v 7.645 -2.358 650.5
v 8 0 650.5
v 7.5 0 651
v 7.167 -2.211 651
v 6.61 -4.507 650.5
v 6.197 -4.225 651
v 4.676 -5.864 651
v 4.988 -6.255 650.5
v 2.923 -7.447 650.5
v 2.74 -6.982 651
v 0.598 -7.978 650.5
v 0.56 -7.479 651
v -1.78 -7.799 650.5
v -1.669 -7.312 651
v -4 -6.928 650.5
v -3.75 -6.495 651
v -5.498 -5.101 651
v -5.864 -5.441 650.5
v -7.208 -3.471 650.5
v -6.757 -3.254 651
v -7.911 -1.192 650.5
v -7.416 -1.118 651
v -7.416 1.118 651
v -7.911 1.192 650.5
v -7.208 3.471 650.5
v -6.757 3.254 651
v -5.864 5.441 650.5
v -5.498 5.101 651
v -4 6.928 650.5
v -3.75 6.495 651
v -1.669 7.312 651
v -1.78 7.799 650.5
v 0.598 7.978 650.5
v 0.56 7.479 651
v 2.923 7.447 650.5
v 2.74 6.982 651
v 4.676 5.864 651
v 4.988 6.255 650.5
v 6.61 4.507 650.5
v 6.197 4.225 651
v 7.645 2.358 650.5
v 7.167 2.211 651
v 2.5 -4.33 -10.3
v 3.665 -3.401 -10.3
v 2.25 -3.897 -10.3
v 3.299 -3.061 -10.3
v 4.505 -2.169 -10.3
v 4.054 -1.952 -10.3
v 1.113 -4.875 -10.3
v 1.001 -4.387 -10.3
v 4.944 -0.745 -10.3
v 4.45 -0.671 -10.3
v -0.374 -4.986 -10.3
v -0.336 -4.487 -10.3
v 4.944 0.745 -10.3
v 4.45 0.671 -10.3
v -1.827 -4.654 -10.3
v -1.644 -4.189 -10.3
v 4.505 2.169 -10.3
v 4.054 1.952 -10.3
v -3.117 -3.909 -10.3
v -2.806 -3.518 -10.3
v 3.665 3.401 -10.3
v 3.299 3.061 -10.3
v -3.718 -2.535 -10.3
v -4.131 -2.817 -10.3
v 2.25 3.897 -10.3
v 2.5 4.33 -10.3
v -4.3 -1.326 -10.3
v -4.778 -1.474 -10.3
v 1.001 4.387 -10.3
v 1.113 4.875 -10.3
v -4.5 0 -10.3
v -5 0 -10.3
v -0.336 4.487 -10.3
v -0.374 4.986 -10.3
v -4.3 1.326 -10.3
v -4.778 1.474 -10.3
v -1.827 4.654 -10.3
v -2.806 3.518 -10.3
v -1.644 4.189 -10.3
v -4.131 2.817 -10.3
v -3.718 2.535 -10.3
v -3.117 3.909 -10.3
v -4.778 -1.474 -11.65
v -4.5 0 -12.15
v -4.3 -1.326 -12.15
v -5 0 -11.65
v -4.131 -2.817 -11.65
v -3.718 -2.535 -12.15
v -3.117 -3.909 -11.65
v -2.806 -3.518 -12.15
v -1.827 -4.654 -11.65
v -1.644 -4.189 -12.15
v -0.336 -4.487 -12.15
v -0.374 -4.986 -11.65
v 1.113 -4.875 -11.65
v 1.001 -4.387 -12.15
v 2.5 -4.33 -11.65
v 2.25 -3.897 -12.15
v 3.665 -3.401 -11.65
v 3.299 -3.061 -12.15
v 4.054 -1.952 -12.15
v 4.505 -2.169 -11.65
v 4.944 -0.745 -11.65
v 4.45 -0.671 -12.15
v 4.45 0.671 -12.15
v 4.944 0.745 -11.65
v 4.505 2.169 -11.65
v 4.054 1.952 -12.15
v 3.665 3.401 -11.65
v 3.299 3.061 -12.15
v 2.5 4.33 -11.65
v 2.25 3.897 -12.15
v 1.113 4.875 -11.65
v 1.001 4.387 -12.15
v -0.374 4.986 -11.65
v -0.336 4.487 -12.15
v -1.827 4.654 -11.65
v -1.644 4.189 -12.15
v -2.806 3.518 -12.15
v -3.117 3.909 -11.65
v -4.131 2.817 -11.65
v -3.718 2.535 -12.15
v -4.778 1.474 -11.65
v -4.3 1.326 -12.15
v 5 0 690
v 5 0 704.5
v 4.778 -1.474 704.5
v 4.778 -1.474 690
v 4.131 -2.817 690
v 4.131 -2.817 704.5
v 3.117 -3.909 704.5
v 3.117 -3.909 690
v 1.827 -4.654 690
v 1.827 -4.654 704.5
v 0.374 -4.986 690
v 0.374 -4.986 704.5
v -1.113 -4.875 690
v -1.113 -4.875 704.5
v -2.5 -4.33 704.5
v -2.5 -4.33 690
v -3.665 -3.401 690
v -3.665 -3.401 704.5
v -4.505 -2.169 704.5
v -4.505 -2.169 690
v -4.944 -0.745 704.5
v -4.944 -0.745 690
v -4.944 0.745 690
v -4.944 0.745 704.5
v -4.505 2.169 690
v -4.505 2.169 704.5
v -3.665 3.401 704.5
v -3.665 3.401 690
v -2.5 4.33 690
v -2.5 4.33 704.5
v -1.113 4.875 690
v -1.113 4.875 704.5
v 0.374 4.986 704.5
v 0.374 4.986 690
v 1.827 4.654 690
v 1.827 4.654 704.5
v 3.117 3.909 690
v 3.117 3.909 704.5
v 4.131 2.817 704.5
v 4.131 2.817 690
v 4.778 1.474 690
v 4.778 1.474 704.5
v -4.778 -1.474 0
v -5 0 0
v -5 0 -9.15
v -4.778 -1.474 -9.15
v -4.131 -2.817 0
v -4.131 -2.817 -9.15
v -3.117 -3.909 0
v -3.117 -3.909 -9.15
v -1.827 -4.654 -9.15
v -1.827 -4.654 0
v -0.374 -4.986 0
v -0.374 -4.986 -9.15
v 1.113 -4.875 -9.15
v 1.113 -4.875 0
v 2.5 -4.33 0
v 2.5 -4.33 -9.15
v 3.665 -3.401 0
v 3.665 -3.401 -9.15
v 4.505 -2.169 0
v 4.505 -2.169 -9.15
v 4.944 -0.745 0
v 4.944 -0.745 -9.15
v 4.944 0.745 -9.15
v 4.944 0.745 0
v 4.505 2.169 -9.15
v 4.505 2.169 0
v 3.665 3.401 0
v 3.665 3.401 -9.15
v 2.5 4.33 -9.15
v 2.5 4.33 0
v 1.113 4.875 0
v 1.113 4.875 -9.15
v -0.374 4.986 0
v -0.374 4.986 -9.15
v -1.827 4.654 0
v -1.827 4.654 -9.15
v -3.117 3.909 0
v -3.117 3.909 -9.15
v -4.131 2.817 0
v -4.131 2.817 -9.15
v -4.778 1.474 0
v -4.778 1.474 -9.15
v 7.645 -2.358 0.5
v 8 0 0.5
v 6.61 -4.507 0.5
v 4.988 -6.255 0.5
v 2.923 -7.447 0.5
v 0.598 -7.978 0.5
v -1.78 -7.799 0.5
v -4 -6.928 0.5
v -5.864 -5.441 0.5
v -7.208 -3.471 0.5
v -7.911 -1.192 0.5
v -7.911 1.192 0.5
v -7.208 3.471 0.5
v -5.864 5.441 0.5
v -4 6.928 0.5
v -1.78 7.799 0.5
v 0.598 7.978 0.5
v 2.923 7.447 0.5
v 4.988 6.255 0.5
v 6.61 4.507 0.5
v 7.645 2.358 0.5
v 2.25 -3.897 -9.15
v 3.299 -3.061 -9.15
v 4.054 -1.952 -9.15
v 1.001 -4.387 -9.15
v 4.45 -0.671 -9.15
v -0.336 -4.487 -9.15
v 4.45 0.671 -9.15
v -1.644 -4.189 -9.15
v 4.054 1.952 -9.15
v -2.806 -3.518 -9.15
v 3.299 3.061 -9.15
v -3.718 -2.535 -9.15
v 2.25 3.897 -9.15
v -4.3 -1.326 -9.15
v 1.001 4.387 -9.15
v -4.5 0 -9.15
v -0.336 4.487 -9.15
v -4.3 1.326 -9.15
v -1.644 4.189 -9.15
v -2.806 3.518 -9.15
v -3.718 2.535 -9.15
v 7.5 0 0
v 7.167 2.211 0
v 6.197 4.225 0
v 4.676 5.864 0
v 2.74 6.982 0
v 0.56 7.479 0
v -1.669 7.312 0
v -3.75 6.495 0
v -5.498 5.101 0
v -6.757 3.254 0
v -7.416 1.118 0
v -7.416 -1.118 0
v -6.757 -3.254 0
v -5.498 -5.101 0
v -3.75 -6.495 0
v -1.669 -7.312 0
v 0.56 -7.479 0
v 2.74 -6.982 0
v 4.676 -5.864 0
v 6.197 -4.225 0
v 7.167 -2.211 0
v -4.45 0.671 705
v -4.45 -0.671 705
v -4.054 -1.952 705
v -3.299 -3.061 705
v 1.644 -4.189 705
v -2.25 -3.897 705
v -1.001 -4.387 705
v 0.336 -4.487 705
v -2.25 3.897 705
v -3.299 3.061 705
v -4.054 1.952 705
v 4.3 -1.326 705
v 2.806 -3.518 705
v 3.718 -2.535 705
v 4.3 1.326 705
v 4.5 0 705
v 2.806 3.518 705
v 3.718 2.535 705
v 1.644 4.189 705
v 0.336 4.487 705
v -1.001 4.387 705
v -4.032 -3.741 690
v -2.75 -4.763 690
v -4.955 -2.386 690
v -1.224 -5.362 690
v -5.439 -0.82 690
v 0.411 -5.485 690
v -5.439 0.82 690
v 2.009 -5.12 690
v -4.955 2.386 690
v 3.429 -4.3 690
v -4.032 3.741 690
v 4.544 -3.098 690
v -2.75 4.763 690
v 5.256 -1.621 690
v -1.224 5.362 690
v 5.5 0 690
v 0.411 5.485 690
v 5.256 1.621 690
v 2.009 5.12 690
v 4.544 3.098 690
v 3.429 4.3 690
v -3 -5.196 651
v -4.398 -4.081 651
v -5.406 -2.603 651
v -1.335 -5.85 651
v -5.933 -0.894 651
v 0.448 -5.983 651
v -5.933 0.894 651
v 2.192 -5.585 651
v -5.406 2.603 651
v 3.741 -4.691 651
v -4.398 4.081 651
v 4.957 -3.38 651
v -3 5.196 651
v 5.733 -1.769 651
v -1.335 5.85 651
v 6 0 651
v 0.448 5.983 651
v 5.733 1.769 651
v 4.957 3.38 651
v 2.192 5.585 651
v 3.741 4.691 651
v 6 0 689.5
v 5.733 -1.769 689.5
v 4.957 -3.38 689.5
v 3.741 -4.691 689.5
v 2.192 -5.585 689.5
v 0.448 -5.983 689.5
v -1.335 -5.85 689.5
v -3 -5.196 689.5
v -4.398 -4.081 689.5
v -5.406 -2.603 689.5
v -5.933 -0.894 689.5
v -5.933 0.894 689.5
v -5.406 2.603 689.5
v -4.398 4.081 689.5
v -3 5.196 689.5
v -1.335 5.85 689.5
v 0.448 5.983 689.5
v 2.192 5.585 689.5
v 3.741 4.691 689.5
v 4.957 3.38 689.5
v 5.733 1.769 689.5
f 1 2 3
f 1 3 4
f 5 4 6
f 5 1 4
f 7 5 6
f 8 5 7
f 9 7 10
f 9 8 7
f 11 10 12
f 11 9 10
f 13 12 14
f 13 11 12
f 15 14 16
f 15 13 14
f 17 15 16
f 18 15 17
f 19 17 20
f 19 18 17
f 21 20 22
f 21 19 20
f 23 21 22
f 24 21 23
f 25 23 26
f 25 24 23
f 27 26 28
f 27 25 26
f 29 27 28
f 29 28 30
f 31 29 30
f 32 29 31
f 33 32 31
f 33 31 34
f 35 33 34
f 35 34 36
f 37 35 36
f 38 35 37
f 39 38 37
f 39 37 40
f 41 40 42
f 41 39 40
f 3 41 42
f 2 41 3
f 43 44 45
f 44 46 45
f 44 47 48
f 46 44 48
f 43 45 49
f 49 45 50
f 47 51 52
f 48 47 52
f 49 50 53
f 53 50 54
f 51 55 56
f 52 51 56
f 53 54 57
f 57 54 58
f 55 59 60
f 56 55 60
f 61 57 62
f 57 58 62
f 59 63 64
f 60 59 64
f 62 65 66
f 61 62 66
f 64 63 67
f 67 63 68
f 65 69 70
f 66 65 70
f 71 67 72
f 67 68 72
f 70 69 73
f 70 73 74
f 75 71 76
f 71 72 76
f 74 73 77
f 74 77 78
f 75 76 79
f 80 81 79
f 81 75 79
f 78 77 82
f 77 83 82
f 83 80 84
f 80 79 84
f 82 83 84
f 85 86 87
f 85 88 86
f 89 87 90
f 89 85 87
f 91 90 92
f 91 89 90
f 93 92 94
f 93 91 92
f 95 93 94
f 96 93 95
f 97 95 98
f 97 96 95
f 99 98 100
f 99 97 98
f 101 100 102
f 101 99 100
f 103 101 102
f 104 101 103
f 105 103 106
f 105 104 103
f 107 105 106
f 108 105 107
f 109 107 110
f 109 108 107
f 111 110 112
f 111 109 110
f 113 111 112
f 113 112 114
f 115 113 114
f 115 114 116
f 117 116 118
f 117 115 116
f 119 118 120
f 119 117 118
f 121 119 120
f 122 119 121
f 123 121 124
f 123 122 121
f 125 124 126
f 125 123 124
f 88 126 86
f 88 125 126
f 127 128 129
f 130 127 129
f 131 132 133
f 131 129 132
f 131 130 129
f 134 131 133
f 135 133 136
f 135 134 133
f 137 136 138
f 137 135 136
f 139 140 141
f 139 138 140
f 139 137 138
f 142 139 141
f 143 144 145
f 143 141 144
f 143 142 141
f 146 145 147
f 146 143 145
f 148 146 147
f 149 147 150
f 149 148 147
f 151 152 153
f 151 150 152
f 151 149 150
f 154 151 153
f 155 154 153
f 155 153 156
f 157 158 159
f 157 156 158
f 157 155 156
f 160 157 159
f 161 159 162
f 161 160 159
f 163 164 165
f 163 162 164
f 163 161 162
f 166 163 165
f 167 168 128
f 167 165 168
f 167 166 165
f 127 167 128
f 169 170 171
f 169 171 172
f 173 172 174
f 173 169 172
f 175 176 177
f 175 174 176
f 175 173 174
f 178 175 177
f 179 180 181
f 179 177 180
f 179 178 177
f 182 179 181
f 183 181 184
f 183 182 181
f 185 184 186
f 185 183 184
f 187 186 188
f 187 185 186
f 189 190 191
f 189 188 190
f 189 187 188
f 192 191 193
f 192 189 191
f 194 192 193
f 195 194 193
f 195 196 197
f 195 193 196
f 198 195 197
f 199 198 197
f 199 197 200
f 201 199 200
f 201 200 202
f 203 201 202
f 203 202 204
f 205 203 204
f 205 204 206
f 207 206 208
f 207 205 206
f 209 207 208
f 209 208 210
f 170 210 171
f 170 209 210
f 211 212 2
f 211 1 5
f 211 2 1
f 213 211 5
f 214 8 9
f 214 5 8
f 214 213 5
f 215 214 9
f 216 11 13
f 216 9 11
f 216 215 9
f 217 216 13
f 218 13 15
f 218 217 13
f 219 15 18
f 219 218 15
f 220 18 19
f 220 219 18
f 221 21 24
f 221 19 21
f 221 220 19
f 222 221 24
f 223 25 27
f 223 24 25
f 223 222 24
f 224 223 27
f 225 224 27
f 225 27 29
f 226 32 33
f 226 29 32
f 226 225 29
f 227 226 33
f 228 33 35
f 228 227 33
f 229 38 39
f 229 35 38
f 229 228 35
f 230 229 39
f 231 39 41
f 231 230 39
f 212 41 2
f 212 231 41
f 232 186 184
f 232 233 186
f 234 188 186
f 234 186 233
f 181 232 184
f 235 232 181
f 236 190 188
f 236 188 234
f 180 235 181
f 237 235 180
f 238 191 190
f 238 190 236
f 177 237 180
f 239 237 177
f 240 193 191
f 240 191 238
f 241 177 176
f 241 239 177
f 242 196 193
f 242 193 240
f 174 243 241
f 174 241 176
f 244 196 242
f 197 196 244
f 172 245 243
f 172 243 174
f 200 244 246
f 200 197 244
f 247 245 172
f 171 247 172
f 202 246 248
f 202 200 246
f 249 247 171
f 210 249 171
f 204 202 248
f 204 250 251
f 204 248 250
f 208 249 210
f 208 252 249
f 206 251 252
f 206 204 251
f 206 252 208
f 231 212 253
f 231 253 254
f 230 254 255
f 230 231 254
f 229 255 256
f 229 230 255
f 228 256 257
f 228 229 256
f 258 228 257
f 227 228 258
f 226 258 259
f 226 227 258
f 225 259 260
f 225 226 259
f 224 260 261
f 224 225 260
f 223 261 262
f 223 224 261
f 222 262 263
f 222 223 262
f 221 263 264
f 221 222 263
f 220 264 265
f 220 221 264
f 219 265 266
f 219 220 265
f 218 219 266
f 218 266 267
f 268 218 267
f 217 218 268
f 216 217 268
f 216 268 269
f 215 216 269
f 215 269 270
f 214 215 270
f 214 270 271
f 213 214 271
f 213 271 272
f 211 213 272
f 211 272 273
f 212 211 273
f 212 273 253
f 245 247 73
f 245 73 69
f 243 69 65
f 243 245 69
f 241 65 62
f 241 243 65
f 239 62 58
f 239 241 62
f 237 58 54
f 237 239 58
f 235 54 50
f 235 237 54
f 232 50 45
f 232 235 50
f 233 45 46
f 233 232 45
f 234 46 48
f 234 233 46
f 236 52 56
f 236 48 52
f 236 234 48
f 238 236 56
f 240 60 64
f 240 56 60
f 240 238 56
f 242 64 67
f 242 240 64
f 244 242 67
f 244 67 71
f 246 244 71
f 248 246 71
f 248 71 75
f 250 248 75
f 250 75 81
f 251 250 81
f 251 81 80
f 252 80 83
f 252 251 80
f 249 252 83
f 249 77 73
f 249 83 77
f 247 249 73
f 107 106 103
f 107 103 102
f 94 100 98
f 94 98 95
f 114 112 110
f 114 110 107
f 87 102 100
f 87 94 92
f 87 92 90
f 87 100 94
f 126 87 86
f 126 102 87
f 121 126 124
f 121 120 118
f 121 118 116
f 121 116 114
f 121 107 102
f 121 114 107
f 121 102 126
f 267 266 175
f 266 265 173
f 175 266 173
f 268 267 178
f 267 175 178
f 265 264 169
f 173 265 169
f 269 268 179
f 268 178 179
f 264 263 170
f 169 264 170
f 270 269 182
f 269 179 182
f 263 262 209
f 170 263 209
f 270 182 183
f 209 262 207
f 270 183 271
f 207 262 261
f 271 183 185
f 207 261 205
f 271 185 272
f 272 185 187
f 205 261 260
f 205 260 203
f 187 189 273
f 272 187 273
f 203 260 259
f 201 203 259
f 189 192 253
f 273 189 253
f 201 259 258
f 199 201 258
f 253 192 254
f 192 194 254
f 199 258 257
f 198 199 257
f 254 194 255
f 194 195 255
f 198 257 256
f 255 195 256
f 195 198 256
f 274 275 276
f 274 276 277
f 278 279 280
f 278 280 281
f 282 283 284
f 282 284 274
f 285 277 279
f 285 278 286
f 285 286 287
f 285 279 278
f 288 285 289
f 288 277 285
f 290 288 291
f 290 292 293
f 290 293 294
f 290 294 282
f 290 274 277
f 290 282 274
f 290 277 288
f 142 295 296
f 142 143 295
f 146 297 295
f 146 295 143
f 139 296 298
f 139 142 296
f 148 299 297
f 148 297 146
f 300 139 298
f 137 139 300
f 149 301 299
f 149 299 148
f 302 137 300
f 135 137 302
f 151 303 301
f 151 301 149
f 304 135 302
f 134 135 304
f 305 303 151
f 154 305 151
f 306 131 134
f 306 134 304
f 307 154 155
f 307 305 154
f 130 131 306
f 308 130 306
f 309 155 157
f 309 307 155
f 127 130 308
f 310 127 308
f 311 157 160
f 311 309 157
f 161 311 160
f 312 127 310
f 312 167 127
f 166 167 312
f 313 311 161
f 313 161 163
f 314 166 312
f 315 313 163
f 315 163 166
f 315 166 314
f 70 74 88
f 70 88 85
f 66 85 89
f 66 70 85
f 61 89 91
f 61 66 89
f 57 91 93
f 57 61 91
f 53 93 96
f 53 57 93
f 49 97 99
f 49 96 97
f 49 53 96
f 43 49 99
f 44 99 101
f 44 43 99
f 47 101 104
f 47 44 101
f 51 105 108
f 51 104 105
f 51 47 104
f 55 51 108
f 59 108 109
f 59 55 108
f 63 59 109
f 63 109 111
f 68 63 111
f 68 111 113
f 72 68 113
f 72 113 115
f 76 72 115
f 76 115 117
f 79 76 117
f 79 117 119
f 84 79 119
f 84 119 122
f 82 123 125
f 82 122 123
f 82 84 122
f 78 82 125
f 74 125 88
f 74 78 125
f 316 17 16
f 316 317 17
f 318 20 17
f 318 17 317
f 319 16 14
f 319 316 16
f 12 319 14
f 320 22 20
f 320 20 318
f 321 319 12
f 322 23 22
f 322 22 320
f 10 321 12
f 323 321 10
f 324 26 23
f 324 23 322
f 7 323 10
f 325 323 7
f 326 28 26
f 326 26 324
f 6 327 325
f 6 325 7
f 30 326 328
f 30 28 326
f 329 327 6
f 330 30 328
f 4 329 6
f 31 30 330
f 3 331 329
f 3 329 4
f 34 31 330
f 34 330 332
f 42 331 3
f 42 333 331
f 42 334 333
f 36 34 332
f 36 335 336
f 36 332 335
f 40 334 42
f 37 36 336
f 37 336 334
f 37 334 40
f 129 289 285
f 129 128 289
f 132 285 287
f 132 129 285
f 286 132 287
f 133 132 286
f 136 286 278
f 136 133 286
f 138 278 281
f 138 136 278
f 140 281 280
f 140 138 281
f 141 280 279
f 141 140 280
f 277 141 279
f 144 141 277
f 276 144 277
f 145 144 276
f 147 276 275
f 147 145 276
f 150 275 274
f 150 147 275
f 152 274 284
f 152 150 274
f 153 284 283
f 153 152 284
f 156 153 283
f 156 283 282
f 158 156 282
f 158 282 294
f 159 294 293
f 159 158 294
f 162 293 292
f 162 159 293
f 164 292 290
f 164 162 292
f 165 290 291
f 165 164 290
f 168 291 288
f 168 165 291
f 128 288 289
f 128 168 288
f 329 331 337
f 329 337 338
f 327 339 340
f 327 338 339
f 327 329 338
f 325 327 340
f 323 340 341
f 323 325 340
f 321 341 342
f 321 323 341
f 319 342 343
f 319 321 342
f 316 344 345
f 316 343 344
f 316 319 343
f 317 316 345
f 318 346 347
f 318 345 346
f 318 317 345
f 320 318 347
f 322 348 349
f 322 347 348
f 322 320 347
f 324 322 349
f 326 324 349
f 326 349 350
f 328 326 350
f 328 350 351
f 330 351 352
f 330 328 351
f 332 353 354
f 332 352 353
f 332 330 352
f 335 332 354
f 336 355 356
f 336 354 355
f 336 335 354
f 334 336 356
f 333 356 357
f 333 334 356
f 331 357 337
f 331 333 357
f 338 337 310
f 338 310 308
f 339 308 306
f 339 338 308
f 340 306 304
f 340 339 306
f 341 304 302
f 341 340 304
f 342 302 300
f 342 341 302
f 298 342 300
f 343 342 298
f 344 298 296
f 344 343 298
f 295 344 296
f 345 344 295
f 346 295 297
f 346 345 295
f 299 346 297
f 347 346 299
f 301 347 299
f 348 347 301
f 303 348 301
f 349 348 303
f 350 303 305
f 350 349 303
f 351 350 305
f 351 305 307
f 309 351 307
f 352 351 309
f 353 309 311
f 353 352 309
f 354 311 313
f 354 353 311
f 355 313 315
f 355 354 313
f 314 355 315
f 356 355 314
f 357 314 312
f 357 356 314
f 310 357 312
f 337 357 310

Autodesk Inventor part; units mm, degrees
ref_plane "YZ Plane" through (0, 0, 0) normal (1, 0, 0) x (0, 1, 0)
ref_plane "XZ Plane" through (0, 0, 0) normal (0, 1, 0) x (-1, 0, 0)
ref_plane "XY Plane" through (0, 0, 0) normal (0, 0, 1) x (1, 0, 0)
sketch "Esboço1" plane through (0, 0, 0) normal (0, 0, 1) x (1, 0, 0)
  circle A0 centre (0, 0) radius 8
  dimension "d0" = 16
extrude "Extrusão1" add sketch "Esboço1" along normal blind 651
sketch "Esboço2" plane through (0, 0, 651) normal (0, 0, 1) x (1, 0, 0)
  circle A0 centre (0, 0) radius 6
  dimension "d3" = 12
extrude "Extrusão2" add sketch "Esboço2" along normal blind 39
sketch "Esboço3" plane through (0, 0, 690) normal (0, 0, 1) x (1, 0, 0)
  circle A0 centre (0, 0) radius 5
  dimension "d6" = 10
extrude "Extrusão3" add sketch "Esboço3" along normal blind 15
sketch "Esboço4" plane through (0, 0, 0) normal (0, 0, -1) x (-1, 0, 0)
  circle A0 centre (0, 0) radius 5
  dimension "d9" = 10
extrude "Extrusão4" add sketch "Esboço4" along normal blind 9.15
sketch "Esboço5" plane through (0, 0, -9.15) normal (0, 0, -1) x (-1, 0, 0)
  circle A0 centre (0, 0) radius 4.5
  dimension "d12" = 9
extrude "Extrusão5" add sketch "Esboço5" along normal blind 1.15
sketch "Esboço6" plane through (0, 0, -10.3) normal (0, 0, -1) x (-1, 0, 0)
  circle A0 centre (0, 0) radius 5
  dimension "d15" = 10
extrude "Extrusão6" add sketch "Esboço6" along normal blind 1.85
thread "Rosca1" size "M12x1.75" class "6g" standard "ANSI Metric M Profile" length 14
chamfer "Chanfro1" distance 0.5 angle 45 5 edges at (-5, 0, 705) (-6, 0, 690) (-8, 0, 651) (-8, 0, 0) (5, 0, -12.15)
properties part number "SFU16XX_X"
